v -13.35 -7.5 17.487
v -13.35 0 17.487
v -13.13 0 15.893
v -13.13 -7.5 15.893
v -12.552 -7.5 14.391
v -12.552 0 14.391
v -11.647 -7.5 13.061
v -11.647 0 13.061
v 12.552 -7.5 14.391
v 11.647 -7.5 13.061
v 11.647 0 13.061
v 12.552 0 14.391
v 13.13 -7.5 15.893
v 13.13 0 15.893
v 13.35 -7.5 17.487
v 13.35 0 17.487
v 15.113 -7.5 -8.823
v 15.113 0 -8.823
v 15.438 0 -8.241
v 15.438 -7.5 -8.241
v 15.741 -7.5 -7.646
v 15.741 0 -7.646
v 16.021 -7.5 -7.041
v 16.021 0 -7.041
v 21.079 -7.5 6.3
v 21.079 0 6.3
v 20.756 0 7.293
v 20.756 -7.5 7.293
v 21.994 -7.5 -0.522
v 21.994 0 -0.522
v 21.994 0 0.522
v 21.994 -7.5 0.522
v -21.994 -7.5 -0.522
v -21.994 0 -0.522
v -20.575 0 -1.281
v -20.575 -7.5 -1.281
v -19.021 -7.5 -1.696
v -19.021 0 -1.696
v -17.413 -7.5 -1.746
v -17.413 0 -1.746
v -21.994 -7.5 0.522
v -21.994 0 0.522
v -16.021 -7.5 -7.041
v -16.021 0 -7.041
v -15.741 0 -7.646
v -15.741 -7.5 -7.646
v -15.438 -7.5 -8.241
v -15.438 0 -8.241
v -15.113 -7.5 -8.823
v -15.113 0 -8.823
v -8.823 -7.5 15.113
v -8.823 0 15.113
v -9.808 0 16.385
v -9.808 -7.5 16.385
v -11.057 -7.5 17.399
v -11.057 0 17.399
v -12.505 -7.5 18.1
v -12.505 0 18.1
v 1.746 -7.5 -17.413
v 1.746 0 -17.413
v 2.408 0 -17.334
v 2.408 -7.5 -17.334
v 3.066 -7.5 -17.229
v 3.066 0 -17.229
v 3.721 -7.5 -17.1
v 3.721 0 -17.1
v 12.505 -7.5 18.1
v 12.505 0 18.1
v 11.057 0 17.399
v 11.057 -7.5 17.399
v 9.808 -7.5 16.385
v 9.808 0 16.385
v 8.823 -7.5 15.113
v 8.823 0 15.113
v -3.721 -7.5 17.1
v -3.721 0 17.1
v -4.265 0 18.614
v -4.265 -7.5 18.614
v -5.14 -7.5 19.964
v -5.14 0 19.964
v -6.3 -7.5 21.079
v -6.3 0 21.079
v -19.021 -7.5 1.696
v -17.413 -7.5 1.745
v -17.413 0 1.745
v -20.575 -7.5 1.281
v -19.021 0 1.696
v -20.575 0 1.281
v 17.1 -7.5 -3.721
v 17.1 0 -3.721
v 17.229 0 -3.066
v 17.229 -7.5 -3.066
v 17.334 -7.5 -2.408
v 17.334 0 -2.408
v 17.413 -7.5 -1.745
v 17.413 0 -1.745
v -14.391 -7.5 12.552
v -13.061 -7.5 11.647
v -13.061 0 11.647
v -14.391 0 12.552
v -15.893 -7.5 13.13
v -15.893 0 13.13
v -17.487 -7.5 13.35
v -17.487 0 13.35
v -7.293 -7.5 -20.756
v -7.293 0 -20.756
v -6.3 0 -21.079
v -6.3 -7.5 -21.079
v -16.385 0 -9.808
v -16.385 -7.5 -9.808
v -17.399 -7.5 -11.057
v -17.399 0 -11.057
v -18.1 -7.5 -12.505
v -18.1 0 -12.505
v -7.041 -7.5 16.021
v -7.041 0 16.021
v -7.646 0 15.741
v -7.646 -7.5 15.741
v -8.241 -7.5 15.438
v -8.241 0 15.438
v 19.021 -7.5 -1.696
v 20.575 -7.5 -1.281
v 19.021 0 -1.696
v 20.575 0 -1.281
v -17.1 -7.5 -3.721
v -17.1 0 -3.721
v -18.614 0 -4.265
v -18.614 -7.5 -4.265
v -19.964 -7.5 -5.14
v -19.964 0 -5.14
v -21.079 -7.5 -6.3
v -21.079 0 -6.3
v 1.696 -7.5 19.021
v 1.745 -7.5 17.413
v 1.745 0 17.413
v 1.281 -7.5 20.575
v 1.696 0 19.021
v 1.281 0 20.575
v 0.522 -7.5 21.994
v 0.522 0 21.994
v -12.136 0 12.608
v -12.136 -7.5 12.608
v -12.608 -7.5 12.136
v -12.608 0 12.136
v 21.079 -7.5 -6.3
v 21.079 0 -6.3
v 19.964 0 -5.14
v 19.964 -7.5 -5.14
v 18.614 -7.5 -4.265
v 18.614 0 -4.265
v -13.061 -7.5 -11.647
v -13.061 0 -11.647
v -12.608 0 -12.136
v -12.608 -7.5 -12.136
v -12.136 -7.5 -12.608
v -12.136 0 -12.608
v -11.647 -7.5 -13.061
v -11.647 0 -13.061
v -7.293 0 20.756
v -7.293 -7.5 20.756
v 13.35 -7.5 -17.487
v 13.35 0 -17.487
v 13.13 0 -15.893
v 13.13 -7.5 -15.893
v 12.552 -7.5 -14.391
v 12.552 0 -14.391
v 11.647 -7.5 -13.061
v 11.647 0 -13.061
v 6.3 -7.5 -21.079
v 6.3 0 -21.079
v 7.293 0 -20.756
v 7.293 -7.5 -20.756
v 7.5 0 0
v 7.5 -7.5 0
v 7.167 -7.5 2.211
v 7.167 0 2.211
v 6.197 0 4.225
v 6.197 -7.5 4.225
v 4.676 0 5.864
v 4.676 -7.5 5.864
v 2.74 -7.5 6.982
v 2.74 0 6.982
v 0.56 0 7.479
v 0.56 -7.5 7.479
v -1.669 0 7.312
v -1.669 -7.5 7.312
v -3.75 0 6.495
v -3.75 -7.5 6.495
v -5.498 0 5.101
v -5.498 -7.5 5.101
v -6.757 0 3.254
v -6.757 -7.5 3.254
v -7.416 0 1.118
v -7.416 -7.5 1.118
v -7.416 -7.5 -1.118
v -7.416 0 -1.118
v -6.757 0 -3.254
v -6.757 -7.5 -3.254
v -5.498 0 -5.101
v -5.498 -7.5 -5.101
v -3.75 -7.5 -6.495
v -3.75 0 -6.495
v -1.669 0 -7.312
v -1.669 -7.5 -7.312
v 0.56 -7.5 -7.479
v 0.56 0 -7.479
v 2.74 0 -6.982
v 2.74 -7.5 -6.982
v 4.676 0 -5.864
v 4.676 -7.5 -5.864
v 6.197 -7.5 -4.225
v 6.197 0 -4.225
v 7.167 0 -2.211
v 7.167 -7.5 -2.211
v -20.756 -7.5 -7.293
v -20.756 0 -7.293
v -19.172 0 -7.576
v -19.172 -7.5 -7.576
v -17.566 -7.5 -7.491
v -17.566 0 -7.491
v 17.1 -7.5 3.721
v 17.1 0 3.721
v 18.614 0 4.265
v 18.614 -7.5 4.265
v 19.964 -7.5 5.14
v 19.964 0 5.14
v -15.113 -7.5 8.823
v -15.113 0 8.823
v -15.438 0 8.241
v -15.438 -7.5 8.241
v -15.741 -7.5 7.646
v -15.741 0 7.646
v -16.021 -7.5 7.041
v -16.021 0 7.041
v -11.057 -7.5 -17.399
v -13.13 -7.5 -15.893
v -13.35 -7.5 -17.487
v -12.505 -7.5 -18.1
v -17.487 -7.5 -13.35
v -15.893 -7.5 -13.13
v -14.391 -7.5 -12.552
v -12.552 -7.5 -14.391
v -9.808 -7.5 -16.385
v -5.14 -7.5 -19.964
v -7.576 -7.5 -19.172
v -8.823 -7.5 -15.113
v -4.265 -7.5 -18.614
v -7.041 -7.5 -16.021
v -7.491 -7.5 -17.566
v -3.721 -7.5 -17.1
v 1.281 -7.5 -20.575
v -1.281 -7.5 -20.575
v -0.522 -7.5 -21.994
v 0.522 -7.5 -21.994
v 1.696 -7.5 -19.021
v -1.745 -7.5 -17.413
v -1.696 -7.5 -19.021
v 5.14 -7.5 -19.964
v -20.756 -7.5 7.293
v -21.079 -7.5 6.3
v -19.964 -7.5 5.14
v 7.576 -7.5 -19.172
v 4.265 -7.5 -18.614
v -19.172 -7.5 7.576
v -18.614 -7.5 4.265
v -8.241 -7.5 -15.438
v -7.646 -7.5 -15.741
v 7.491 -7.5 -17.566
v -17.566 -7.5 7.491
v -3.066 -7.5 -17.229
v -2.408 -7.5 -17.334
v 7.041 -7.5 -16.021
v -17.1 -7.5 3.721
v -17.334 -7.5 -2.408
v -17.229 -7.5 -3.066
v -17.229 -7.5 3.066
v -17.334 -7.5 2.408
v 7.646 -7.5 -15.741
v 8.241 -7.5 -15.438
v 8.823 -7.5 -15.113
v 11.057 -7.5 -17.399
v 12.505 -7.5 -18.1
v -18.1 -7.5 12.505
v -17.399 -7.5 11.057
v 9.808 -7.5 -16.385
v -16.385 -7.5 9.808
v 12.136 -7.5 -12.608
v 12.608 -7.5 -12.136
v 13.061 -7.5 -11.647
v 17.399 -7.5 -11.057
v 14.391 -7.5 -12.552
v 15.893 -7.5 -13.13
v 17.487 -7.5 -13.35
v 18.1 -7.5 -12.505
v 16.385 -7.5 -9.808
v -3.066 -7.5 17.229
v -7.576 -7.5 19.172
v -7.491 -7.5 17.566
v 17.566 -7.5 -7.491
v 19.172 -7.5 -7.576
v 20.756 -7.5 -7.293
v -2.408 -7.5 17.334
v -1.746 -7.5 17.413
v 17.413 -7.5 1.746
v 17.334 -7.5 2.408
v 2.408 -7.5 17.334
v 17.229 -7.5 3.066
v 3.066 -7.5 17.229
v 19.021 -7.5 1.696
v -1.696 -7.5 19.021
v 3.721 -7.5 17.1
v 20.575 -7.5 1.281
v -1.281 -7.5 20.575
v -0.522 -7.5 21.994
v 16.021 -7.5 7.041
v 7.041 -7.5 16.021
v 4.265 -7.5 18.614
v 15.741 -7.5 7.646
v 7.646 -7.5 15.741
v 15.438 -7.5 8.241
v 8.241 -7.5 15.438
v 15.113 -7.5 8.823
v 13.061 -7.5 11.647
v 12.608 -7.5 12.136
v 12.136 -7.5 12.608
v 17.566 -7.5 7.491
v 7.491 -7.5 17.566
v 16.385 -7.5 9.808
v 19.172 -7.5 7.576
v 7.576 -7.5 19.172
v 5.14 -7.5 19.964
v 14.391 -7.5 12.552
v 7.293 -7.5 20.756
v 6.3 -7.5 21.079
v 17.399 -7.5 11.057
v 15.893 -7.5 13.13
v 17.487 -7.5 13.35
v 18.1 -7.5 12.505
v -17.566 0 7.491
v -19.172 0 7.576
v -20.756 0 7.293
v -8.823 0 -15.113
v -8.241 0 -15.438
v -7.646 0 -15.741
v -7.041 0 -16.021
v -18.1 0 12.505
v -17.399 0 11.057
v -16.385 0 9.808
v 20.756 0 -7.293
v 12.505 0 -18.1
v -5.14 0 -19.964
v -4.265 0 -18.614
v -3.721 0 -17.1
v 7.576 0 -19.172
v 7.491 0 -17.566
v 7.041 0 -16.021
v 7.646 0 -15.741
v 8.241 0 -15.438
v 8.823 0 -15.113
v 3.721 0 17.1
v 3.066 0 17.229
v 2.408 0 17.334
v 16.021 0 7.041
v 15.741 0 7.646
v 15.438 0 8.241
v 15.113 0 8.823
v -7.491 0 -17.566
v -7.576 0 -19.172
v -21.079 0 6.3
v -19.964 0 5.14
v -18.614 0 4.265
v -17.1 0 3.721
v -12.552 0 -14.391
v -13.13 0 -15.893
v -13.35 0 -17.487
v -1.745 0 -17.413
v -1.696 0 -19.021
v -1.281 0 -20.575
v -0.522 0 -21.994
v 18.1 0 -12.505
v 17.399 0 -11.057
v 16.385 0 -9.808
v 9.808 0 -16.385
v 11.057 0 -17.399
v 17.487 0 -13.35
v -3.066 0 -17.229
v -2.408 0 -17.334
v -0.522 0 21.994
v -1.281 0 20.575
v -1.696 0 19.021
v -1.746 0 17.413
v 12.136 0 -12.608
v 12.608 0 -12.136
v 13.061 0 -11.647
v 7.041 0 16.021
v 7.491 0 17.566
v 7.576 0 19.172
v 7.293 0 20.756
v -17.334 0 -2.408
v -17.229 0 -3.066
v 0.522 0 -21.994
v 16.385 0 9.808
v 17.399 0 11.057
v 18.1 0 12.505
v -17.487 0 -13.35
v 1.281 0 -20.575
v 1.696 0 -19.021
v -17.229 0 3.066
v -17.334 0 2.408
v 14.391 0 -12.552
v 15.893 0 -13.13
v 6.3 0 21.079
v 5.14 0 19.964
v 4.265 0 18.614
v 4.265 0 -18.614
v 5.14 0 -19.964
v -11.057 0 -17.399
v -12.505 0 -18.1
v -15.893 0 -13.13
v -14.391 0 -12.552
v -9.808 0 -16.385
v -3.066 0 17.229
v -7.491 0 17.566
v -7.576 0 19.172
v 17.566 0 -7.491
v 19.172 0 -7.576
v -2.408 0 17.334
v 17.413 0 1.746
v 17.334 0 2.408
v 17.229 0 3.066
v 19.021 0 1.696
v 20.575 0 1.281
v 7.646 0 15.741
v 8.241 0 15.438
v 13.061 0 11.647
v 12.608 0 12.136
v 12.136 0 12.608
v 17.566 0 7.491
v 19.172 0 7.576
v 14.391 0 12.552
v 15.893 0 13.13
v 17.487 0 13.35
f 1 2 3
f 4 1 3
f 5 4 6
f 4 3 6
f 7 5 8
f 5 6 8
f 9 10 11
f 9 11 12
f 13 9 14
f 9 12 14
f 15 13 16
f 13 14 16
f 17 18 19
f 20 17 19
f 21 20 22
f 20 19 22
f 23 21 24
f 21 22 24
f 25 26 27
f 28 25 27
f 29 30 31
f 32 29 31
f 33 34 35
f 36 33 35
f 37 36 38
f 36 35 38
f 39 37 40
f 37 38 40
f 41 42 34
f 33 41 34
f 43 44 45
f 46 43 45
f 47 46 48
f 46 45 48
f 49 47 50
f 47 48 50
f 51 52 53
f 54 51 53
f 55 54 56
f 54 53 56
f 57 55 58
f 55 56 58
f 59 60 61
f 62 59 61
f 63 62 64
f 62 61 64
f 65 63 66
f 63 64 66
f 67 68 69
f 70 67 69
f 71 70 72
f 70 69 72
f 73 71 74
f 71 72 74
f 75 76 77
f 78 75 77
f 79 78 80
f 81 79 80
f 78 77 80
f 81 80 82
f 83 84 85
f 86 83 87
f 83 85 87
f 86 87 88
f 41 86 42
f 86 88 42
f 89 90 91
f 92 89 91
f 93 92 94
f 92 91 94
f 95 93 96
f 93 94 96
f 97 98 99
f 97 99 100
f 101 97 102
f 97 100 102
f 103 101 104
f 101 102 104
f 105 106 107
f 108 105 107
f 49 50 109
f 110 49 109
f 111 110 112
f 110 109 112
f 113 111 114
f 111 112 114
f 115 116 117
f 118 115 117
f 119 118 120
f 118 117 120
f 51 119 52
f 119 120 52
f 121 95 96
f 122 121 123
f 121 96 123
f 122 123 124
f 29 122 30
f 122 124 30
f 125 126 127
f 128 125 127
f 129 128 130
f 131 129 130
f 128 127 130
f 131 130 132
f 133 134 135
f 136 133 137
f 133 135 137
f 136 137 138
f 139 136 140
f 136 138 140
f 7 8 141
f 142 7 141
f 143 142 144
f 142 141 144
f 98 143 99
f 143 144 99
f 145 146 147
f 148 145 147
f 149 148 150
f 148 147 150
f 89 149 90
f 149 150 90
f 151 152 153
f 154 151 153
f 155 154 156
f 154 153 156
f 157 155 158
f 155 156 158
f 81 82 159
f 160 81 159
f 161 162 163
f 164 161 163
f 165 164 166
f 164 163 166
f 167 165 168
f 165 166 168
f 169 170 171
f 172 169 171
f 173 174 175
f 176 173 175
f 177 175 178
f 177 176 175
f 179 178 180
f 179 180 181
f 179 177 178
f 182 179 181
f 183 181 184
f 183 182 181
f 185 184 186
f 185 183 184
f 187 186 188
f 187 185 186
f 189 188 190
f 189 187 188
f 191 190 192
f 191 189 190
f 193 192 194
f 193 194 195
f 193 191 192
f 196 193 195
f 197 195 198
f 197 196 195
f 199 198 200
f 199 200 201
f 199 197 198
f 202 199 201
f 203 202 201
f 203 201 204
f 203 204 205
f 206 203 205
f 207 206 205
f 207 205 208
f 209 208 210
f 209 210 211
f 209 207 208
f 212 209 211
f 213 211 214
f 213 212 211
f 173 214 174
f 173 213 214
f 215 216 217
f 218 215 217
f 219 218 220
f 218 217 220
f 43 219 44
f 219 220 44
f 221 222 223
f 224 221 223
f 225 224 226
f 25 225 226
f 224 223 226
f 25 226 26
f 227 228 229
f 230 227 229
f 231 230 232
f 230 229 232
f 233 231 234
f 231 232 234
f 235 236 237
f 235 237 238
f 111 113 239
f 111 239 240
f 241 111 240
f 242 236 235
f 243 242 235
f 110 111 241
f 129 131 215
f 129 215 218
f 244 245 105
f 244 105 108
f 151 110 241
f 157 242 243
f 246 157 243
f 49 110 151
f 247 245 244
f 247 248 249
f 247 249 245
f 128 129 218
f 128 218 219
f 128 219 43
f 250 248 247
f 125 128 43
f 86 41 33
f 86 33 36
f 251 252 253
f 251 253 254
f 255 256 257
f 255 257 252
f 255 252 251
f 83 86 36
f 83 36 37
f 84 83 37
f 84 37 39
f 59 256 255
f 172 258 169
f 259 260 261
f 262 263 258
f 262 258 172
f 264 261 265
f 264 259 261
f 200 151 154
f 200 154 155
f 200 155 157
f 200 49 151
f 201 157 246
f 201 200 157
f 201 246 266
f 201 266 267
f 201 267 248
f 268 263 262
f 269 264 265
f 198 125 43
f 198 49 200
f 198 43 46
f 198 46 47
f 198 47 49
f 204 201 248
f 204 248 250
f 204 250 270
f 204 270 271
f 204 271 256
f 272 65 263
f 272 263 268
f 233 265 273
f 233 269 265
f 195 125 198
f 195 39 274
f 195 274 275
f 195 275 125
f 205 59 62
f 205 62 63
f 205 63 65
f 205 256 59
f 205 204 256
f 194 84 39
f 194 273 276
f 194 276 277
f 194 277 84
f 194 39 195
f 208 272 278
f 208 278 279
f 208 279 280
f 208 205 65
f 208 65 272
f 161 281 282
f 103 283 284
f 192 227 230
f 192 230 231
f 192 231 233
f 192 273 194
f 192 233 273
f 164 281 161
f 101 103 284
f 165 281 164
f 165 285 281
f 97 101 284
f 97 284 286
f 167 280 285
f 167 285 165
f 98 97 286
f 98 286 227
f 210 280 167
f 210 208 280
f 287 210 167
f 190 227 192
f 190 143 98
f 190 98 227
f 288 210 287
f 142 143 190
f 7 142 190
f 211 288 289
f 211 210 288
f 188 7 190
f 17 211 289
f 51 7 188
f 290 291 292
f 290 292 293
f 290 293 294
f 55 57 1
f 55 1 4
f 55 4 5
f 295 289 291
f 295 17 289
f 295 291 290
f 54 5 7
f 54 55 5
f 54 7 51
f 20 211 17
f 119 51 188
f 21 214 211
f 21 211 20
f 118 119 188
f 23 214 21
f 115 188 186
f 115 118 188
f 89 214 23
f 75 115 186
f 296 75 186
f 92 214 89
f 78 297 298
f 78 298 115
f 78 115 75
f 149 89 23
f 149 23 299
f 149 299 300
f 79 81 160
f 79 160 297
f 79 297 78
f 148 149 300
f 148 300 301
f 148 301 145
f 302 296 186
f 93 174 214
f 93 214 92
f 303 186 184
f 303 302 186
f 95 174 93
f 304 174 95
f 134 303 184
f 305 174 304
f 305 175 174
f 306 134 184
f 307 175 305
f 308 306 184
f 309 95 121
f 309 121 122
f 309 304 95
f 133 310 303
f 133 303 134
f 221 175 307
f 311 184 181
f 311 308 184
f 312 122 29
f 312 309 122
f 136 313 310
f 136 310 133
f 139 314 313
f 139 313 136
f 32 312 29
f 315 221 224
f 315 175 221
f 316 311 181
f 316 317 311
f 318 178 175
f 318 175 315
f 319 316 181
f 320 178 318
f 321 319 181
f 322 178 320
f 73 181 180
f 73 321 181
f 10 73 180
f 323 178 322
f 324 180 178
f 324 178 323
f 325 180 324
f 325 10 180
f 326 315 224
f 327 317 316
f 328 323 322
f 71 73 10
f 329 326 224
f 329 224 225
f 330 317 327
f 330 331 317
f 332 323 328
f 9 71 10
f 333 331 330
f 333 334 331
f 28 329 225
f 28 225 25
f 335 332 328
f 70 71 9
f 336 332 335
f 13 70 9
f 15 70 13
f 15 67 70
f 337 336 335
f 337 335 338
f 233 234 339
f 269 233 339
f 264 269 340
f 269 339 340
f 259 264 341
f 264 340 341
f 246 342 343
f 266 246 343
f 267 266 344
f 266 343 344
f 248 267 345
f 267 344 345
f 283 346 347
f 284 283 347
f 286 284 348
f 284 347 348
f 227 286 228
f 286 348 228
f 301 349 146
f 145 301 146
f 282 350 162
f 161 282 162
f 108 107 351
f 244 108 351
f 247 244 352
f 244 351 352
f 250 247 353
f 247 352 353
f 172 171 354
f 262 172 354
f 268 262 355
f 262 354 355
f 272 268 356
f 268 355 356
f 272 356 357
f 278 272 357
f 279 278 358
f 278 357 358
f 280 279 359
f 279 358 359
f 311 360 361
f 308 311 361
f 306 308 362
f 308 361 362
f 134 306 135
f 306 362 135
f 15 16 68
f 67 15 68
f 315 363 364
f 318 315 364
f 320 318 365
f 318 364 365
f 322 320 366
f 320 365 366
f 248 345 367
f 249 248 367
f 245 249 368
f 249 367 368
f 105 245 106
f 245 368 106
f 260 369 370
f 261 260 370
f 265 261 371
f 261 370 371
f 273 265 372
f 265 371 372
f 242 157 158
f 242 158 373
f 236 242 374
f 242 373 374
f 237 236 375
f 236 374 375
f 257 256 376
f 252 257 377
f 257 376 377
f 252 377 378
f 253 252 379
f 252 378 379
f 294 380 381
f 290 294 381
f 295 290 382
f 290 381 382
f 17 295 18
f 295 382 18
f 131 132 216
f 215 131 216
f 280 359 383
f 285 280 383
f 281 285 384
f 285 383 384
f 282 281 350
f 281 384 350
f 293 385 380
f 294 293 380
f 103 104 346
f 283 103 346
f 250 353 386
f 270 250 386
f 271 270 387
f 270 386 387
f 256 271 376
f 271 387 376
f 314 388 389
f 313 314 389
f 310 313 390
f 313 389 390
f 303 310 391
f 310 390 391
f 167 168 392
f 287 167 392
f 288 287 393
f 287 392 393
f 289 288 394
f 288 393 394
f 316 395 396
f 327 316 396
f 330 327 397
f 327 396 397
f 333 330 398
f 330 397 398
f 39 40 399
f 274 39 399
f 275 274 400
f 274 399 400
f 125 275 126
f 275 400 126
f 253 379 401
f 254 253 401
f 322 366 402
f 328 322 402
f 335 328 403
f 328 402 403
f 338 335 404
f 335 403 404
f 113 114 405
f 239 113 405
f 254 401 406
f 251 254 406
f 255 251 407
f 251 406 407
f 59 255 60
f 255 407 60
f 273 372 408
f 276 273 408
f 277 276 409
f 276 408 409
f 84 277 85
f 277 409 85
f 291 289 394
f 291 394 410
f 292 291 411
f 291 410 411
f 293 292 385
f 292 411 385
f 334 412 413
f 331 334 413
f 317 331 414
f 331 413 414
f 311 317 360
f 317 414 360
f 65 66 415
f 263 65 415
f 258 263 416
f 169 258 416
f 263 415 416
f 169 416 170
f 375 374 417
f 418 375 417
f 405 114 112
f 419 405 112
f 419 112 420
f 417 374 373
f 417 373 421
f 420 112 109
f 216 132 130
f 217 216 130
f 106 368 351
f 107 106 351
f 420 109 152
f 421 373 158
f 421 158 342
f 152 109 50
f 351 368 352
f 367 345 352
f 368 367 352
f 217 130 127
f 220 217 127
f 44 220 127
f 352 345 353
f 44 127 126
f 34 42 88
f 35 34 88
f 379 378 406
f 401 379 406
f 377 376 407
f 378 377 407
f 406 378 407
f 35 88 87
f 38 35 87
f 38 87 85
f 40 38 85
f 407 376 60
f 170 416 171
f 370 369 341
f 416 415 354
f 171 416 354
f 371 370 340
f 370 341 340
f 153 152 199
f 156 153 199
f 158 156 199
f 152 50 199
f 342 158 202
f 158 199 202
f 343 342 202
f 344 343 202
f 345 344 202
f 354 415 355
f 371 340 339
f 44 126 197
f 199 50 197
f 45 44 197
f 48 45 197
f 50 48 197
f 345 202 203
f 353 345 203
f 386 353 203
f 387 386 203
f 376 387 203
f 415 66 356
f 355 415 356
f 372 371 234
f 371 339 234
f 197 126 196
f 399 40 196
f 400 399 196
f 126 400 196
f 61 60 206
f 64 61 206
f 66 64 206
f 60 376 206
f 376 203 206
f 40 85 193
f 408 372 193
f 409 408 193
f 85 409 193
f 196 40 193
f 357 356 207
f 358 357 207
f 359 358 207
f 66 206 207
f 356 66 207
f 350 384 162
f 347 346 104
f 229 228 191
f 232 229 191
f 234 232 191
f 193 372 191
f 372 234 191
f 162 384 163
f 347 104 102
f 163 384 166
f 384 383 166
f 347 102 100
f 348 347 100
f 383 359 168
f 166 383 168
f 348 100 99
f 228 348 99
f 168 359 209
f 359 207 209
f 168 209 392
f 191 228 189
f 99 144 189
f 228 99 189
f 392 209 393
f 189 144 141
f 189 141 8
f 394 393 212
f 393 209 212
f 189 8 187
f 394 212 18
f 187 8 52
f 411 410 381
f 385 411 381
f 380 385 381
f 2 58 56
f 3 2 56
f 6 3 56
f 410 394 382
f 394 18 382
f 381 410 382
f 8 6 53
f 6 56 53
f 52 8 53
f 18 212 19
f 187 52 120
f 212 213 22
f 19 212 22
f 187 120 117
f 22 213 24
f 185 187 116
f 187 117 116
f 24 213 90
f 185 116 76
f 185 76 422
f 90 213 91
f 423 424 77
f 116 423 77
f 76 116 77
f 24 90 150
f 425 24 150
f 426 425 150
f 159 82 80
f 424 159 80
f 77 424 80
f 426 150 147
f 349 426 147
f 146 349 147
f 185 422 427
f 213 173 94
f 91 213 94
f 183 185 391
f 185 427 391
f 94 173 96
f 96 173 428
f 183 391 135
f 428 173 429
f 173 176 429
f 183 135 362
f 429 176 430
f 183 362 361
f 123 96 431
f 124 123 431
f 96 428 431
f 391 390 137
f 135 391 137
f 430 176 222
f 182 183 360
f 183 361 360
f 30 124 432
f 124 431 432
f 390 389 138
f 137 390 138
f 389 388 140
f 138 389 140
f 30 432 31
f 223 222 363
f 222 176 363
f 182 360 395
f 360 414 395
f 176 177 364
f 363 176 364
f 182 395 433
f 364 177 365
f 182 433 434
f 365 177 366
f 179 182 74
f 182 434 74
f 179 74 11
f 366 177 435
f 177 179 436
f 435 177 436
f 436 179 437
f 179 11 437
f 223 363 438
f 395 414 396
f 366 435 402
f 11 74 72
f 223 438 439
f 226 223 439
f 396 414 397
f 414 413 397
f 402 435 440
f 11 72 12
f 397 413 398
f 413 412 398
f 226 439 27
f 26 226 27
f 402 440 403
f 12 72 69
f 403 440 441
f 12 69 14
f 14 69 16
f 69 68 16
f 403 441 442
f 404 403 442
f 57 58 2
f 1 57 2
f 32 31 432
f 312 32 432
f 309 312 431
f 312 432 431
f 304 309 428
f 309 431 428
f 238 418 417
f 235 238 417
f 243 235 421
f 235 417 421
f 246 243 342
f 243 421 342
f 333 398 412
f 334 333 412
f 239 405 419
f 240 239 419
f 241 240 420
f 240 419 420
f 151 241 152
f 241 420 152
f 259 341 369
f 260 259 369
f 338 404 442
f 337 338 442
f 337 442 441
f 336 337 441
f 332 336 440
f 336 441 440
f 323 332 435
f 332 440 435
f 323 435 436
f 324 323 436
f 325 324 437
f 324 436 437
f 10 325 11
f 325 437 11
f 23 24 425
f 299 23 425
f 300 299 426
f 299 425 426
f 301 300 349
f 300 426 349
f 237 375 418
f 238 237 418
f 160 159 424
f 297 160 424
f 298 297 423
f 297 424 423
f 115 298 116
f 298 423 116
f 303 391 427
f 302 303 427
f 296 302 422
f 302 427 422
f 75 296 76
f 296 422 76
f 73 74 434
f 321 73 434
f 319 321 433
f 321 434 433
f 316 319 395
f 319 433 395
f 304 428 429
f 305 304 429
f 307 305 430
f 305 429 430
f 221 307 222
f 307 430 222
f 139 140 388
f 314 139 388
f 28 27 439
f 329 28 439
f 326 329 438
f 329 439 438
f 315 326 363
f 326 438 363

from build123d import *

# Parameters (mm, degrees)
F0_R     = 7.5
F1_DEPTH = 7.5


with BuildPart() as f1:
    # F0 (on Front) → F1 (new body)
    with BuildSketch(Plane.XZ):
        with BuildLine():
            ThreePointArc((-1.7455, 17.412732), (0, 17.5), (1.7455, 17.412732))
            ThreePointArc((1.7455, 17.412732), (1.533451, 19.81002), (0.522, 21.993806))
            Line((0.522, 21.993806), (-0.522, 21.993806))
            ThreePointArc((-0.522, 21.993806), (-1.533451, 19.81002), (-1.7455, 17.412732))
        make_face()
        with BuildLine():
            ThreePointArc((17.412732, -1.7455), (17.478169, -0.87384), (17.5, 0))
            ThreePointArc((17.5, 0), (17.478169, 0.87384), (17.412732, 1.7455))
            ThreePointArc((17.412732, 1.7455), (17.284546, 2.737603), (17.099881, 3.720761))
            ThreePointArc((17.099881, 3.720761), (16.643489, 5.407797), (16.021103, 7.040899))
            ThreePointArc((16.021103, 7.040899), (15.592614, 7.944834), (15.113175, 8.822808))
            ThreePointArc((15.113175, 8.822808), (14.157797, 10.286242), (13.061217, 11.647086))
            ThreePointArc((13.061217, 11.647086), (12.374369, 12.374369), (11.647086, 13.061217))
            ThreePointArc((11.647086, 13.061217), (10.286242, 14.157797), (8.822808, 15.113175))
            ThreePointArc((8.822808, 15.113175), (7.944834, 15.592614), (7.040899, 16.021103))
            ThreePointArc((7.040899, 16.021103), (5.407797, 16.643489), (3.720761, 17.099881))
            ThreePointArc((3.720761, 17.099881), (2.737603, 17.284546), (1.7455, 17.412732))
            ThreePointArc((1.7455, 17.412732), (0, 17.5), (-1.7455, 17.412732))
            ThreePointArc((-1.7455, 17.412732), (-2.737603, 17.284546), (-3.720761, 17.099881))
            ThreePointArc((-3.720761, 17.099881), (-5.407797, 16.643489), (-7.040899, 16.021103))
            ThreePointArc((-7.040899, 16.021103), (-7.944834, 15.592614), (-8.822808, 15.113175))
            ThreePointArc((-8.822808, 15.113175), (-10.286242, 14.157797), (-11.647086, 13.061217))
            ThreePointArc((-11.647086, 13.061217), (-12.374369, 12.374369), (-13.061217, 11.647086))
            ThreePointArc((-13.061217, 11.647086), (-14.157797, 10.286242), (-15.113175, 8.822808))
            ThreePointArc((-15.113175, 8.822808), (-15.592614, 7.944834), (-16.021103, 7.040899))
            ThreePointArc((-16.021103, 7.040899), (-16.643489, 5.407797), (-17.099881, 3.720761))
            ThreePointArc((-17.099881, 3.720761), (-17.284546, 2.737603), (-17.412732, 1.7455))
            ThreePointArc((-17.412732, 1.7455), (-17.5, 0), (-17.412732, -1.7455))
            ThreePointArc((-17.412732, -1.7455), (-17.284546, -2.737603), (-17.099881, -3.720761))
            ThreePointArc((-17.099881, -3.720761), (-16.643489, -5.407797), (-16.021103, -7.040899))
            ThreePointArc((-16.021103, -7.040899), (-15.592614, -7.944834), (-15.113175, -8.822808))
            ThreePointArc((-15.113175, -8.822808), (-14.157797, -10.286242), (-13.061217, -11.647086))
            ThreePointArc((-13.061217, -11.647086), (-12.374369, -12.374369), (-11.647086, -13.061217))
            ThreePointArc((-11.647086, -13.061217), (-10.286242, -14.157797), (-8.822808, -15.113175))
            ThreePointArc((-8.822808, -15.113175), (-7.944834, -15.592614), (-7.040899, -16.021103))
            ThreePointArc((-7.040899, -16.021103), (-5.407797, -16.643489), (-3.720761, -17.099881))
            ThreePointArc((-3.720761, -17.099881), (-2.737603, -17.284546), (-1.7455, -17.412732))
            ThreePointArc((-1.7455, -17.412732), (0, -17.5), (1.7455, -17.412732))
            ThreePointArc((1.7455, -17.412732), (2.737603, -17.284546), (3.720761, -17.099881))
            ThreePointArc((3.720761, -17.099881), (5.407797, -16.643489), (7.040899, -16.021103))
            ThreePointArc((7.040899, -16.021103), (7.944834, -15.592614), (8.822808, -15.113175))
            ThreePointArc((8.822808, -15.113175), (10.286242, -14.157797), (11.647086, -13.061217))
            ThreePointArc((11.647086, -13.061217), (12.374369, -12.374369), (13.061217, -11.647086))
            ThreePointArc((13.061217, -11.647086), (14.157797, -10.286242), (15.113175, -8.822808))
            ThreePointArc((15.113175, -8.822808), (15.592614, -7.944834), (16.021103, -7.040899))
            ThreePointArc((16.021103, -7.040899), (16.643489, -5.407797), (17.099881, -3.720761))
            ThreePointArc((17.099881, -3.720761), (17.284546, -2.737603), (17.412732, -1.7455))
        make_face()
        Circle(F0_R, mode=Mode.SUBTRACT)
        with BuildLine():
            ThreePointArc((-7.040899, 16.021103), (-5.407797, 16.643489), (-3.720761, 17.099881))
            ThreePointArc((-3.720761, 17.099881), (-4.663234, 19.314311), (-6.300008, 21.07866))
            Line((-6.300008, 21.07866), (-7.292911, 20.756046))
            ThreePointArc((-7.292911, 20.756046), (-7.580032, 18.366586), (-7.040899, 16.021103))
        make_face()
        with BuildLine():
            ThreePointArc((-11.647086, 13.061217), (-10.286242, 14.157797), (-8.822808, 15.113175))
            ThreePointArc((-8.822808, 15.113175), (-10.40345, 16.927983), (-12.505328, 18.100187))
            Line((-12.505328, 18.100187), (-13.349942, 17.486539))
            ThreePointArc((-13.349942, 17.486539), (-12.884626, 15.125303), (-11.647086, 13.061217))
        make_face()
        with BuildLine():
            ThreePointArc((-15.113175, 8.822808), (-14.157797, 10.286242), (-13.061217, 11.647086))
            ThreePointArc((-13.061217, 11.647086), (-15.125303, 12.884626), (-17.486539, 13.349942))
            Line((-17.486539, 13.349942), (-18.100187, 12.505328))
            ThreePointArc((-18.100187, 12.505328), (-16.927983, 10.40345), (-15.113175, 8.822808))
        make_face()
        with BuildLine():
            ThreePointArc((-17.099881, 3.720761), (-16.643489, 5.407797), (-16.021103, 7.040899))
            ThreePointArc((-16.021103, 7.040899), (-18.366586, 7.580032), (-20.756046, 7.292911))
            Line((-20.756046, 7.292911), (-21.07866, 6.300008))
            ThreePointArc((-21.07866, 6.300008), (-19.314311, 4.663234), (-17.099881, 3.720761))
        make_face()
        with BuildLine():
            ThreePointArc((-17.412732, -1.7455), (-17.5, 0), (-17.412732, 1.7455))
            ThreePointArc((-17.412732, 1.7455), (-19.81002, 1.533451), (-21.993806, 0.522))
            Line((-21.993806, 0.522), (-21.993806, -0.522))
            ThreePointArc((-21.993806, -0.522), (-19.81002, -1.533451), (-17.412732, -1.7455))
        make_face()
        with BuildLine():
            ThreePointArc((-20.756046, -7.292911), (-18.366586, -7.580032), (-16.021103, -7.040899))
            ThreePointArc((-16.021103, -7.040899), (-16.643489, -5.407797), (-17.099881, -3.720761))
            ThreePointArc((-17.099881, -3.720761), (-19.314311, -4.663234), (-21.07866, -6.300008))
            Line((-21.07866, -6.300008), (-20.756046, -7.292911))
        make_face()
        with BuildLine():
            ThreePointArc((-17.486539, -13.349942), (-15.125303, -12.884626), (-13.061217, -11.647086))
            ThreePointArc((-13.061217, -11.647086), (-14.157797, -10.286242), (-15.113175, -8.822808))
            ThreePointArc((-15.113175, -8.822808), (-16.927983, -10.40345), (-18.100187, -12.505328))
            Line((-18.100187, -12.505328), (-17.486539, -13.349942))
        make_face()
        with BuildLine():
            ThreePointArc((-12.505328, -18.100187), (-10.40345, -16.927983), (-8.822808, -15.113175))
            ThreePointArc((-8.822808, -15.113175), (-10.286242, -14.157797), (-11.647086, -13.061217))
            ThreePointArc((-11.647086, -13.061217), (-12.884626, -15.125303), (-13.349942, -17.486539))
            Line((-13.349942, -17.486539), (-12.505328, -18.100187))
        make_face()
        with BuildLine():
            ThreePointArc((-6.300008, -21.07866), (-4.663234, -19.314311), (-3.720761, -17.099881))
            ThreePointArc((-3.720761, -17.099881), (-5.407797, -16.643489), (-7.040899, -16.021103))
            ThreePointArc((-7.040899, -16.021103), (-7.580032, -18.366586), (-7.292911, -20.756046))
            Line((-7.292911, -20.756046), (-6.300008, -21.07866))
        make_face()
        with BuildLine():
            ThreePointArc((0.522, -21.993806), (1.533451, -19.81002), (1.7455, -17.412732))
            ThreePointArc((1.7455, -17.412732), (0, -17.5), (-1.7455, -17.412732))
            ThreePointArc((-1.7455, -17.412732), (-1.533451, -19.81002), (-0.522, -21.993806))
            Line((-0.522, -21.993806), (0.522, -21.993806))
        make_face()
        with BuildLine():
            ThreePointArc((7.292911, -20.756046), (7.580032, -18.366586), (7.040899, -16.021103))
            ThreePointArc((7.040899, -16.021103), (5.407797, -16.643489), (3.720761, -17.099881))
            ThreePointArc((3.720761, -17.099881), (4.663234, -19.314311), (6.300008, -21.07866))
            Line((6.300008, -21.07866), (7.292911, -20.756046))
        make_face()
        with BuildLine():
            ThreePointArc((13.349942, -17.486539), (12.884626, -15.125303), (11.647086, -13.061217))
            ThreePointArc((11.647086, -13.061217), (10.286242, -14.157797), (8.822808, -15.113175))
            ThreePointArc((8.822808, -15.113175), (10.40345, -16.927983), (12.505328, -18.100187))
            Line((12.505328, -18.100187), (13.349942, -17.486539))
        make_face()
        with BuildLine():
            ThreePointArc((21.07866, -6.300008), (19.314311, -4.663234), (17.099881, -3.720761))
            ThreePointArc((17.099881, -3.720761), (16.643489, -5.407797), (16.021103, -7.040899))
            ThreePointArc((16.021103, -7.040899), (18.366586, -7.580032), (20.756046, -7.292911))
            Line((20.756046, -7.292911), (21.07866, -6.300008))
        make_face()
        with BuildLine():
            ThreePointArc((17.412732, 1.7455), (17.478169, 0.87384), (17.5, 0))
            ThreePointArc((17.5, 0), (17.478169, -0.87384), (17.412732, -1.7455))
            ThreePointArc((17.412732, -1.7455), (19.81002, -1.533451), (21.993806, -0.522))
            Line((21.993806, -0.522), (21.993806, 0.522))
            ThreePointArc((21.993806, 0.522), (19.81002, 1.533451), (17.412732, 1.7455))
        make_face()
        with BuildLine():
            ThreePointArc((18.100187, -12.505328), (16.927983, -10.40345), (15.113175, -8.822808))
            ThreePointArc((15.113175, -8.822808), (14.157797, -10.286242), (13.061217, -11.647086))
            ThreePointArc((13.061217, -11.647086), (15.125303, -12.884626), (17.486539, -13.349942))
            Line((17.486539, -13.349942), (18.100187, -12.505328))
        make_face()
        with BuildLine():
            ThreePointArc((16.021103, 7.040899), (16.643489, 5.407797), (17.099881, 3.720761))
            ThreePointArc((17.099881, 3.720761), (19.314311, 4.663234), (21.07866, 6.300008))
            Line((21.07866, 6.300008), (20.756046, 7.292911))
            ThreePointArc((20.756046, 7.292911), (18.366586, 7.580032), (16.021103, 7.040899))
        make_face()
        with BuildLine():
            ThreePointArc((13.061217, 11.647086), (14.157797, 10.286242), (15.113175, 8.822808))
            ThreePointArc((15.113175, 8.822808), (16.927983, 10.40345), (18.100187, 12.505328))
            Line((18.100187, 12.505328), (17.486539, 13.349942))
            ThreePointArc((17.486539, 13.349942), (15.125303, 12.884626), (13.061217, 11.647086))
        make_face()
        with BuildLine():
            ThreePointArc((8.822808, 15.113175), (10.286242, 14.157797), (11.647086, 13.061217))
            ThreePointArc((11.647086, 13.061217), (12.884626, 15.125303), (13.349942, 17.486539))
            Line((13.349942, 17.486539), (12.505328, 18.100187))
            ThreePointArc((12.505328, 18.100187), (10.40345, 16.927983), (8.822808, 15.113175))
        make_face()
        with BuildLine():
            ThreePointArc((3.720761, 17.099881), (5.407797, 16.643489), (7.040899, 16.021103))
            ThreePointArc((7.040899, 16.021103), (7.580032, 18.366586), (7.292911, 20.756046))
            Line((7.292911, 20.756046), (6.300008, 21.07866))
            ThreePointArc((6.300008, 21.07866), (4.663234, 19.314311), (3.720761, 17.099881))
        make_face()
    extrude(amount=F1_DEPTH)


solid = f1.part
